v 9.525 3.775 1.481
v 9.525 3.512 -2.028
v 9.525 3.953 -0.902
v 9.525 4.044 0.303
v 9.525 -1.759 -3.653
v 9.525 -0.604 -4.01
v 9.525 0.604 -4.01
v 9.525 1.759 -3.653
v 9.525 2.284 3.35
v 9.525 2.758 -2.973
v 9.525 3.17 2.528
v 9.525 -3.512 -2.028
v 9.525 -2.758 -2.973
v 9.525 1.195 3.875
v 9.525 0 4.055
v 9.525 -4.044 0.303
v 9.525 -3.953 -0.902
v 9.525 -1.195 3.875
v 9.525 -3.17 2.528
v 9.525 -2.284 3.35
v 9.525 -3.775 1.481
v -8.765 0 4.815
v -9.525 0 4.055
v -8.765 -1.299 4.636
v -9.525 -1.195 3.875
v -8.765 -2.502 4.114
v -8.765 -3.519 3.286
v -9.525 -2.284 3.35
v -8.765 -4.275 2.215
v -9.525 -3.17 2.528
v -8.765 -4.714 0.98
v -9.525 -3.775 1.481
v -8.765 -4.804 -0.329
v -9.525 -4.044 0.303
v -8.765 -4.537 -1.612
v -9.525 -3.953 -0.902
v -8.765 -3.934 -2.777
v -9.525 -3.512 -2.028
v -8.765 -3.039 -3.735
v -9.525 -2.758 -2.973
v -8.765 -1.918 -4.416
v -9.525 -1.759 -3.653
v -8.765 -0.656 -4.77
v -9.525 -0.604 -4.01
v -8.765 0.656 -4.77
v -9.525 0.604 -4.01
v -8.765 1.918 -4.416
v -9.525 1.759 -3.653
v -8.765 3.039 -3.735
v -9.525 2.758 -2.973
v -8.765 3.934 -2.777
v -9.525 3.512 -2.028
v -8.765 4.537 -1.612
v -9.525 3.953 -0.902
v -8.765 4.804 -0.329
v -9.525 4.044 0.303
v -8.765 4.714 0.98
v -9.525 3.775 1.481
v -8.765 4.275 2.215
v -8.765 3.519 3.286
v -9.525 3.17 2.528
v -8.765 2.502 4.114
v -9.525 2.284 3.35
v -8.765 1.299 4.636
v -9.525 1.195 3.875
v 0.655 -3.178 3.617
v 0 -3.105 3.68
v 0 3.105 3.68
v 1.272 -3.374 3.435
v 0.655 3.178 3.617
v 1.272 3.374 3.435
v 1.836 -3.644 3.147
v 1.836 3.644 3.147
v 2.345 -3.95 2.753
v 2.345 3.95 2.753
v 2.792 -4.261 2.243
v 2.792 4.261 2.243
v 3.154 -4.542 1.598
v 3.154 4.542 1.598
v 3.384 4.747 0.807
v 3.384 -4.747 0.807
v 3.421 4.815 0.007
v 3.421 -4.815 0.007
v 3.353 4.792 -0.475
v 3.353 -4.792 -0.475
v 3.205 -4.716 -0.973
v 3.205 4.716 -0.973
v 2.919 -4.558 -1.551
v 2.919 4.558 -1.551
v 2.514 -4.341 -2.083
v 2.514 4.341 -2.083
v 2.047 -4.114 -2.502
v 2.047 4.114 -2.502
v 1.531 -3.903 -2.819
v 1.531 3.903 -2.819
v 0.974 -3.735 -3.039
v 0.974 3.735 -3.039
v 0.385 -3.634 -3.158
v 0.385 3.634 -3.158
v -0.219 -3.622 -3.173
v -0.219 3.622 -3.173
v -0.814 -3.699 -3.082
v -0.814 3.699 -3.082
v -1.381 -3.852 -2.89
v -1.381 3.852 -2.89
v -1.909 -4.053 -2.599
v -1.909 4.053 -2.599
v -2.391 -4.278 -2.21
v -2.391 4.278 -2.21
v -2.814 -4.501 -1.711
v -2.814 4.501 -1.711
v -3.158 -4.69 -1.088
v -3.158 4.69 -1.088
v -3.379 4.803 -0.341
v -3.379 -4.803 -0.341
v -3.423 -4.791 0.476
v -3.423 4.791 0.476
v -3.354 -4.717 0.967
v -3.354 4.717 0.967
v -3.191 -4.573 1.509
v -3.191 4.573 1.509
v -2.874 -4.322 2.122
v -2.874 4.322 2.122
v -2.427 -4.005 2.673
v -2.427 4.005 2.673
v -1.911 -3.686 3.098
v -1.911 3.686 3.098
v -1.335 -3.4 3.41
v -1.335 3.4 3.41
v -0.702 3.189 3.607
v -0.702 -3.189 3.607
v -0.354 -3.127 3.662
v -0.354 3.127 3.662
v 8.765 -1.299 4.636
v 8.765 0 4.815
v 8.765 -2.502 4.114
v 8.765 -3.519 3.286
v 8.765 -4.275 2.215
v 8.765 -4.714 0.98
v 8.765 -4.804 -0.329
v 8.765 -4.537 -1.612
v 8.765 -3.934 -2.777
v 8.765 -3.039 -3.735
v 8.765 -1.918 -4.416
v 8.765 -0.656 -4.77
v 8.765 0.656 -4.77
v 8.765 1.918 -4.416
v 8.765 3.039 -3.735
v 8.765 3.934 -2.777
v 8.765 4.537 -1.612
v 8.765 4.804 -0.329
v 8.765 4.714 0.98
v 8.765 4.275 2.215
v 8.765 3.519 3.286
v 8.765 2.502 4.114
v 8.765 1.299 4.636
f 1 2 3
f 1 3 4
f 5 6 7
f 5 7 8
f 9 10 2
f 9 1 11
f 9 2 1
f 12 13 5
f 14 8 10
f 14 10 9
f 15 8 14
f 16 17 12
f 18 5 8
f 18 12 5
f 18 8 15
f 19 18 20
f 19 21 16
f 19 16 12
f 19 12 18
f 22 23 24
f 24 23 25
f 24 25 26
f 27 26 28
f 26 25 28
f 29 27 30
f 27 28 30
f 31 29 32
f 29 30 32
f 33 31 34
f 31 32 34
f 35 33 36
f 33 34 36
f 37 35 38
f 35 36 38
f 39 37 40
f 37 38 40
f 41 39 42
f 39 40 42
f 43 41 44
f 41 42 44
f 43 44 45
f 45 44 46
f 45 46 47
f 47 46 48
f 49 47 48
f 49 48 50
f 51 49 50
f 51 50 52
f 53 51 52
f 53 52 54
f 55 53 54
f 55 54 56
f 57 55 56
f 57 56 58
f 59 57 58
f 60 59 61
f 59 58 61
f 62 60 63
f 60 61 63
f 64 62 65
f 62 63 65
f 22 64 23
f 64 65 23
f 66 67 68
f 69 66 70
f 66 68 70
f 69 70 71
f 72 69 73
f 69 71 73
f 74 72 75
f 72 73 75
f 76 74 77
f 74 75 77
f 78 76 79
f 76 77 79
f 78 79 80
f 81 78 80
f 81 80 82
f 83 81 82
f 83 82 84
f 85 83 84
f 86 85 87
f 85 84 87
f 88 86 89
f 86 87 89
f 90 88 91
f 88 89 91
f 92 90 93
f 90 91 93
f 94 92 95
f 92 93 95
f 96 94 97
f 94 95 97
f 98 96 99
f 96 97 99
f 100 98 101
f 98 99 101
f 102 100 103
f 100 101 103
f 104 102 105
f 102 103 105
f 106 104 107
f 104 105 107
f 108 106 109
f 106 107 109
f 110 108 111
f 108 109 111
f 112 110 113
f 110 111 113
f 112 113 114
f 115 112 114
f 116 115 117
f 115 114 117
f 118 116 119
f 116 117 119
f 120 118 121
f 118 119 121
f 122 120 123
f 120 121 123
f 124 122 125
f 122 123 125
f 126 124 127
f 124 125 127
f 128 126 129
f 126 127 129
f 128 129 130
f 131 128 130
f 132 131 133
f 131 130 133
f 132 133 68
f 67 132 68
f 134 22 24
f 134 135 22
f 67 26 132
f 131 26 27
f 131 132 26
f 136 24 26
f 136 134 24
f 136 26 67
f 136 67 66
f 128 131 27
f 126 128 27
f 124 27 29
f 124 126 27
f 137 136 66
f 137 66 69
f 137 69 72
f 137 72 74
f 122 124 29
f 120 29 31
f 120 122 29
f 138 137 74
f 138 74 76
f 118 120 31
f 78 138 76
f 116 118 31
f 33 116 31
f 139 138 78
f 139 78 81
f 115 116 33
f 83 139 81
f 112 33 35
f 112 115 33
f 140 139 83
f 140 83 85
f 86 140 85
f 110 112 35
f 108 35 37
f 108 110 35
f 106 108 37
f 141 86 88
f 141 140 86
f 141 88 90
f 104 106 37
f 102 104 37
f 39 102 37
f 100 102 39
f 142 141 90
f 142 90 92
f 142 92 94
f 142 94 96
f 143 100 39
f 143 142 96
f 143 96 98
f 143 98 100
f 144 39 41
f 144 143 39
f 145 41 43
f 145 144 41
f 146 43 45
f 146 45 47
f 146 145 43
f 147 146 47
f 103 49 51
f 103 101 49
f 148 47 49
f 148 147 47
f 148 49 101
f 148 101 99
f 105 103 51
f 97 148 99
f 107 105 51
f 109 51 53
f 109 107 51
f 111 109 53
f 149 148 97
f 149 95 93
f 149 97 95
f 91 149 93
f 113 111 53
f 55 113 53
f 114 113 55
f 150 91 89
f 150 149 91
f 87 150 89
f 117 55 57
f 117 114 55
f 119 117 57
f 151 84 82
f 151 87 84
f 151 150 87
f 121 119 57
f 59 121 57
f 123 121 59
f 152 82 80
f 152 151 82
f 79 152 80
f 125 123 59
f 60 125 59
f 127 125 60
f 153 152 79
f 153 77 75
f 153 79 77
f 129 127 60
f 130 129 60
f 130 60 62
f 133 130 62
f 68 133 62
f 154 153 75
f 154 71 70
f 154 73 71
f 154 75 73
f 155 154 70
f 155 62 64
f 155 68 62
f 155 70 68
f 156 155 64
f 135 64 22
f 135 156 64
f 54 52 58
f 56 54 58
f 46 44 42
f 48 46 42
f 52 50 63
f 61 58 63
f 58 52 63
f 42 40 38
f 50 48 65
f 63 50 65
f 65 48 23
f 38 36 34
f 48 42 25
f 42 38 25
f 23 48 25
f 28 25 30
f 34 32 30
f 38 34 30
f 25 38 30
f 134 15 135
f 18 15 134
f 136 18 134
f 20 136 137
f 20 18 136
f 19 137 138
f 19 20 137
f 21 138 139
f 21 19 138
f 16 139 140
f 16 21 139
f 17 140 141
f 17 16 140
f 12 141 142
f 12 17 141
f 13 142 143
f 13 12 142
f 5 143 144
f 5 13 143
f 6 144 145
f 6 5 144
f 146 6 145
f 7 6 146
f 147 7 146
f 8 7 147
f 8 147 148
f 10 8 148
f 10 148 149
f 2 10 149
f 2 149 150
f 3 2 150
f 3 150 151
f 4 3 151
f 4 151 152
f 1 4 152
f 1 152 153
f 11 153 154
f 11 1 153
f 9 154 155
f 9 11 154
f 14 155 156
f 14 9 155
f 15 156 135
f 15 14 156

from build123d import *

# Parameters (mm, degrees)
SKETCH1_R           = 4.815
BOSS_EXTRUDE1_DEPTH = 9.525
CHAMFER1_SIZE       = 0.76
SKETCH2_R           = 3.43
CUT_EXTRUDE1_DEPTH  = 95.25


with BuildPart() as part:
    # Sketch1 → Boss-Extrude1 (new, symmetric)
    with BuildSketch(Plane(origin=(0, 0, 0), x_dir=(0, 0, -1), z_dir=(1, 0, 0))):
        with Locations(Location((0, 0, 0), (0, 0, 180))):
            Circle(SKETCH1_R)
    extrude(amount=BOSS_EXTRUDE1_DEPTH, both=True)

    # Chamfer1
    chamfer1_edges = [part.edges().sort_by_distance(p)[0] for p in [
        (-9.525, 0, -4.815),
        (9.525, 0, -4.815),
    ]]
    chamfer(chamfer1_edges, length=CHAMFER1_SIZE)

    # Sketch2 → Cut-Extrude1 (cut, symmetric)
    with BuildSketch(Plane(origin=(0, 0, 0), x_dir=(1, 0, 0), z_dir=(0, 1, 0))):
        with Locations(Location((0, -0.25, 0), (0, 0, 270))):
            Circle(SKETCH2_R)
    extrude(amount=CUT_EXTRUDE1_DEPTH, both=True, mode=Mode.SUBTRACT)


solid = part.part
